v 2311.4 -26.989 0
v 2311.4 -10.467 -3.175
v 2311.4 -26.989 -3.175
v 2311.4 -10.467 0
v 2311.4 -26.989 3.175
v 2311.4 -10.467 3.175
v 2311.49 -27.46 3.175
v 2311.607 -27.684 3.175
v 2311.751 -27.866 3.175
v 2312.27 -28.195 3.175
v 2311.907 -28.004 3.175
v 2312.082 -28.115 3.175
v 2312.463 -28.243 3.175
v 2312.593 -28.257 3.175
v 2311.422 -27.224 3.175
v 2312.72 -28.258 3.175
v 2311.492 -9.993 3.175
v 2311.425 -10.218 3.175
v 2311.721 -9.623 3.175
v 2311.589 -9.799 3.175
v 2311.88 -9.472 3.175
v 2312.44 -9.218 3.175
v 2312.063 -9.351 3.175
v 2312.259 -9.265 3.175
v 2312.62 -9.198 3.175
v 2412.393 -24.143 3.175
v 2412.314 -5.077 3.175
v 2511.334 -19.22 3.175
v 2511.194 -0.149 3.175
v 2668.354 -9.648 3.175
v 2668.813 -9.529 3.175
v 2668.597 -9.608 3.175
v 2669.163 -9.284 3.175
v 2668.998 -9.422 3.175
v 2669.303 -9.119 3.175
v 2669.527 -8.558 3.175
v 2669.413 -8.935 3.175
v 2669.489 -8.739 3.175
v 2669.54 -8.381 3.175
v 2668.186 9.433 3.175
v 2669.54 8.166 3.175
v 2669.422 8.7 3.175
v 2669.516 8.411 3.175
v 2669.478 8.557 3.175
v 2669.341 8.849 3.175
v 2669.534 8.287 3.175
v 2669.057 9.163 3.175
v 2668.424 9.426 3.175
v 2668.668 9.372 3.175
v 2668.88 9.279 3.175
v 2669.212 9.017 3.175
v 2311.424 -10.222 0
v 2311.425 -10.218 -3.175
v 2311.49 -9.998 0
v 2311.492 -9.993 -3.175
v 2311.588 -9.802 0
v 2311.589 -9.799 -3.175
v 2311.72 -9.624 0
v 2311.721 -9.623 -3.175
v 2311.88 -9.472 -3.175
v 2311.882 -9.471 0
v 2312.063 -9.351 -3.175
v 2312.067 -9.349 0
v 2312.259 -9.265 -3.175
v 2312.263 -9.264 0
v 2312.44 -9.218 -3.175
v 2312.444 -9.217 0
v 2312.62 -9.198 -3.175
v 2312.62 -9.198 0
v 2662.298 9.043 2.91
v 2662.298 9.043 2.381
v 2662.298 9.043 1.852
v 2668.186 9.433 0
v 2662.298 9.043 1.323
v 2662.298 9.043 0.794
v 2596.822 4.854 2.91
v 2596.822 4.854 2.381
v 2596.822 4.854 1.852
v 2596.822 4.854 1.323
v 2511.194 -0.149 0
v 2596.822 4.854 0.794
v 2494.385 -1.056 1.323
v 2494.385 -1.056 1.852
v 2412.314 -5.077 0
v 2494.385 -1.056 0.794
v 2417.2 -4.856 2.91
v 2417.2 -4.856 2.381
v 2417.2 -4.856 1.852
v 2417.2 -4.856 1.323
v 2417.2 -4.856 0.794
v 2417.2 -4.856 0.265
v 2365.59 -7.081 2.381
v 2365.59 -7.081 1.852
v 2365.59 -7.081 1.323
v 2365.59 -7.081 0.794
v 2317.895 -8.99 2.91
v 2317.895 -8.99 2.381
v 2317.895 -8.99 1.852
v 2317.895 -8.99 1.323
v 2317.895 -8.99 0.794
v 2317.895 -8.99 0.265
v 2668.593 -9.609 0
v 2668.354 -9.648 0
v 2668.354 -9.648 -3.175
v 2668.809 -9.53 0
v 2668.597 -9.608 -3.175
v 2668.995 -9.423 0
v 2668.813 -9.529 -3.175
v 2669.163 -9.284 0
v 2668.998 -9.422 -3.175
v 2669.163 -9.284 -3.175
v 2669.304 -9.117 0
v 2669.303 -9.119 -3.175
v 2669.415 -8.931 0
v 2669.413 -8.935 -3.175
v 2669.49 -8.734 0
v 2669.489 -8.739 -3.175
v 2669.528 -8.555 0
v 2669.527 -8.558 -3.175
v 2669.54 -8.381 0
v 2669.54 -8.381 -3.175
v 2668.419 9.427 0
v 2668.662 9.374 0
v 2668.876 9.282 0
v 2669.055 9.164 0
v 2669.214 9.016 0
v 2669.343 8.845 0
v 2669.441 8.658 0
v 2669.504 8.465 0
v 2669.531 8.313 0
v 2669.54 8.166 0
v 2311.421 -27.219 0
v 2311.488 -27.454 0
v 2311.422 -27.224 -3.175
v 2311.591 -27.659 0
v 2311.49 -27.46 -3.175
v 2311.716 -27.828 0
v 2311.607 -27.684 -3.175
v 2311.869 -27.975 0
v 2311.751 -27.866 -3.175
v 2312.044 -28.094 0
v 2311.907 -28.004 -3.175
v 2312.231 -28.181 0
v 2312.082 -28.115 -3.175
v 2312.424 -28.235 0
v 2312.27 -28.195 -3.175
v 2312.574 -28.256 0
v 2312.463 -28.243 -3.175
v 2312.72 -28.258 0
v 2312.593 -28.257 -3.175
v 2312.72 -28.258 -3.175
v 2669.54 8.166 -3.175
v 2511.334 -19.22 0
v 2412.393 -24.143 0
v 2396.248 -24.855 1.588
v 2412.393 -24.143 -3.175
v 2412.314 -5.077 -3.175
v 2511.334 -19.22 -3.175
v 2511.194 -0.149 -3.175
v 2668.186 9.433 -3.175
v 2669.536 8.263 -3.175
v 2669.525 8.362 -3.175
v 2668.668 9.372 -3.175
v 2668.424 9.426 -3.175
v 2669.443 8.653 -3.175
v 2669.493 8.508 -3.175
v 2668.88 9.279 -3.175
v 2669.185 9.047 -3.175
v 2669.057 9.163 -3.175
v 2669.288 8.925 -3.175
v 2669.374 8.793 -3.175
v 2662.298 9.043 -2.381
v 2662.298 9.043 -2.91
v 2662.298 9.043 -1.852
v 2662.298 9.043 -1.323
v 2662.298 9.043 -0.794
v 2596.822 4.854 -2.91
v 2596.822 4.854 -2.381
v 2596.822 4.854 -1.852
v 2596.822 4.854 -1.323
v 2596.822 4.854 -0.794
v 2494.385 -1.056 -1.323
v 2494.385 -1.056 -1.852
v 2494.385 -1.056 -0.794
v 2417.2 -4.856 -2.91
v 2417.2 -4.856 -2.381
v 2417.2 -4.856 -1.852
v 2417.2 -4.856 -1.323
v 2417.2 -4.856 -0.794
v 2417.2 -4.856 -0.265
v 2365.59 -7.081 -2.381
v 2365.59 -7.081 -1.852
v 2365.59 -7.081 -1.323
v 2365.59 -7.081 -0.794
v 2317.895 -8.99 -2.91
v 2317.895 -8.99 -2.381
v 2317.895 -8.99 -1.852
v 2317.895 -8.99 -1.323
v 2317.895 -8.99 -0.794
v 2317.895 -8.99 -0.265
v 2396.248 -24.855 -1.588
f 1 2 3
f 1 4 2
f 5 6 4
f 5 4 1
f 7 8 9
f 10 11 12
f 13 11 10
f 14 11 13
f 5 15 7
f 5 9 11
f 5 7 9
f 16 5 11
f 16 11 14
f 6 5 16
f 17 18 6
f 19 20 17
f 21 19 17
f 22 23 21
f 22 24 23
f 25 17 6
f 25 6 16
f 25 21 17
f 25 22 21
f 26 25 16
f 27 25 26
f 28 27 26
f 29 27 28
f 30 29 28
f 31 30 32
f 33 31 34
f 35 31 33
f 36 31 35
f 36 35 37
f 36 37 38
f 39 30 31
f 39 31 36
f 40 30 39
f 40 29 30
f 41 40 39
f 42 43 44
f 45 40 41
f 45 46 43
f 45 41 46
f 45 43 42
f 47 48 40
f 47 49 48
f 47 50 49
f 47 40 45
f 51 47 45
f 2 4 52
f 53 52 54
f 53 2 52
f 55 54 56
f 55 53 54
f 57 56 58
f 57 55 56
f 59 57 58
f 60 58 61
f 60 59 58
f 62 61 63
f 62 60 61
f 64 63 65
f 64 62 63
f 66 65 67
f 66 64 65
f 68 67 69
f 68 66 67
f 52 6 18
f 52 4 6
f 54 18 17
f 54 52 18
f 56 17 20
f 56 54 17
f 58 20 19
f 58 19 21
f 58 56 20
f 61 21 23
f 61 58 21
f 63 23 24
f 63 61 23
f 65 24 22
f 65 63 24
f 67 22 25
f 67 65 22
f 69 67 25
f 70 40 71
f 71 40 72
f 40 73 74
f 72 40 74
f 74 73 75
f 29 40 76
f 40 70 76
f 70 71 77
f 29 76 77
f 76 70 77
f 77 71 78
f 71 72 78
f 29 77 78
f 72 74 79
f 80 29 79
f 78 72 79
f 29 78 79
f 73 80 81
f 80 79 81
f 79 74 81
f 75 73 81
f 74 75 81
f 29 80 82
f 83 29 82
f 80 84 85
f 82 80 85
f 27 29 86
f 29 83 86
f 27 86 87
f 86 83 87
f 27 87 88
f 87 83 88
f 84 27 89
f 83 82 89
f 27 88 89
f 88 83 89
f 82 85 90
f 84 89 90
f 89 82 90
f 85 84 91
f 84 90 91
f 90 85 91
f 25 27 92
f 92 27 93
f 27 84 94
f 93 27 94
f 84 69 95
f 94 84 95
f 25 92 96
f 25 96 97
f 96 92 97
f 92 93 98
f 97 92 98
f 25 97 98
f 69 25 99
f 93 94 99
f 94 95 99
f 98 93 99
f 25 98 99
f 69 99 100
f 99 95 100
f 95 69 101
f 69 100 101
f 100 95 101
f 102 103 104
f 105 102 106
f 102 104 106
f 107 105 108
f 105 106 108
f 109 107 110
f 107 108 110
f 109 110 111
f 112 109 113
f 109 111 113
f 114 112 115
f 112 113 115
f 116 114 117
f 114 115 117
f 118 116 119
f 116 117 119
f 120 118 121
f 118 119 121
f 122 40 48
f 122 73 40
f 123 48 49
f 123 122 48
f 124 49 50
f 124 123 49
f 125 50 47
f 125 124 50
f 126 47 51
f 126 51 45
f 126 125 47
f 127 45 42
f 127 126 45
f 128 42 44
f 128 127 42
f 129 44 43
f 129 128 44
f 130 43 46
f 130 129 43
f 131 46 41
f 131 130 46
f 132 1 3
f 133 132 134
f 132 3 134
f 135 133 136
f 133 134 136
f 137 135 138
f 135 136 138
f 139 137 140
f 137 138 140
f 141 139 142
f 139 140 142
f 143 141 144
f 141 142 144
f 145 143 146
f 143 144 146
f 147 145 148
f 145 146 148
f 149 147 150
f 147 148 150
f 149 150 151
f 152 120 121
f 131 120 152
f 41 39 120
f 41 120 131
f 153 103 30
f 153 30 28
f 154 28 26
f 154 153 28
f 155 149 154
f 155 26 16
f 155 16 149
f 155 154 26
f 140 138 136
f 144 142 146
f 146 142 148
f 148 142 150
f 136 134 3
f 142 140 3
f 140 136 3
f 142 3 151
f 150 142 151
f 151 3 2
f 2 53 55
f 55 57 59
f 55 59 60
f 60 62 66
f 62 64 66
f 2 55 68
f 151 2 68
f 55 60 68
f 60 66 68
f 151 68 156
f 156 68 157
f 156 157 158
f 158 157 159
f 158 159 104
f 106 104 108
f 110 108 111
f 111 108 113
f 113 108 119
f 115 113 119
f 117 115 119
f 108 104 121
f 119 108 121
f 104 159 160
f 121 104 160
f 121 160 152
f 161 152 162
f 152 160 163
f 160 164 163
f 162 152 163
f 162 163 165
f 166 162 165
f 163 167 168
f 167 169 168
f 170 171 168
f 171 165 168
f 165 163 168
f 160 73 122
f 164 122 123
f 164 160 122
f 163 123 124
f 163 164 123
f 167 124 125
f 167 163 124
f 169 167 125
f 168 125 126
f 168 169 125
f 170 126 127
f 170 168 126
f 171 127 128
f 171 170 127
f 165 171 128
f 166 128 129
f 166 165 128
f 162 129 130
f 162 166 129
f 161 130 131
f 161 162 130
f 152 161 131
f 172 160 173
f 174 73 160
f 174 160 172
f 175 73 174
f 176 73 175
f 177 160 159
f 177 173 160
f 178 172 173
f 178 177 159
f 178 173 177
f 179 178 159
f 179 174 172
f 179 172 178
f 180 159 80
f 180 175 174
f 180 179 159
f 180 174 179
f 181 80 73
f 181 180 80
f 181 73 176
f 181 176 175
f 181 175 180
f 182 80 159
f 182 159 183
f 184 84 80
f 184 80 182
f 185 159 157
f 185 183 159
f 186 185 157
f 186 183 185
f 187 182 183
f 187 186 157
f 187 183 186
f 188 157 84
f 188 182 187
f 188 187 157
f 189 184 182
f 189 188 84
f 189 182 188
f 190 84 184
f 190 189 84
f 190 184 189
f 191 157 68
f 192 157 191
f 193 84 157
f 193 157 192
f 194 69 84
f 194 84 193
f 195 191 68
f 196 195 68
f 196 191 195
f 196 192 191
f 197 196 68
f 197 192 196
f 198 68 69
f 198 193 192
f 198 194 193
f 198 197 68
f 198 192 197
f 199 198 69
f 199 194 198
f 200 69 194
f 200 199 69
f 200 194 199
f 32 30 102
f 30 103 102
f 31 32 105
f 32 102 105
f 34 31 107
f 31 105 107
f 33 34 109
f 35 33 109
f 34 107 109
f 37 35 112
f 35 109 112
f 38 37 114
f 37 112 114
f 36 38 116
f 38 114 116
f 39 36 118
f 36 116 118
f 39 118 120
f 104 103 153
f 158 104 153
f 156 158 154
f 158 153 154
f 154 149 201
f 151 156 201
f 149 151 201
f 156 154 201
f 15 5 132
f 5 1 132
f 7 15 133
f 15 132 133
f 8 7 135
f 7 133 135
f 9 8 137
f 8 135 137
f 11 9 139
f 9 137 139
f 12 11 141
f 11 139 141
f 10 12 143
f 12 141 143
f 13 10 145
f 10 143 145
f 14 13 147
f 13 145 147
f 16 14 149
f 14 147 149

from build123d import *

# Parameters (mm, degrees)
BOSS_EXTRUDE1_DEPTH = 3.175
FILLET1_R           = 1.27


with BuildPart() as part:
    # Sketch1 → Boss-Extrude1 (new, symmetric)
    with BuildSketch(Plane.XY):
        with BuildLine():
            Line((2311.4, -9.245652974), (2311.4, -28.310356345))
            add(Edge.make_bspline(
                [(2669.54, -9.569049356), (2615.393603553, -13.17073937), (2561.080658619, -16.536108081), (2506.205230446, -19.758621957), (2434.382223772, -23.29947809), (2362.559217098, -26.286274493), (2345.393069943, -26.972929947), (2328.342945407, -27.644579597), (2311.4, -28.310356345)],
                knots=[103.698913506, 103.698913506, 103.698913506, 103.698913506, 103.698913506, 103.698913506, 130.927896619, 130.927896619, 130.927896619, 139.270260279, 139.270260279, 139.270260279, 139.270260279, 139.270260279, 139.270260279], degree=5))
            Line((2669.54, -9.569049356), (2669.54, 9.5231025))
            add(Edge.make_bspline(
                [(2669.54, 9.5231025), (2667.126494524, 9.36235515), (2659.861586685, 8.880281494), (2635.666282302, 7.292469146), (2596.857665529, 4.826056853), (2545.729743039, 1.758344093), (2494.405305707, -1.098555235), (2451.533022267, -3.266573297), (2417.198316756, -4.86708361), (2391.457076919, -6.003589235), (2365.634736307, -7.086854581), (2341.015642019, -8.078542398), (2322.924133841, -8.79260451), (2313.562932275, -9.160652062), (2311.4, -9.245652974)],
                knots=[103.571582669, 103.571582669, 103.571582669, 103.571582669, 104.300777207, 105.766098403, 110.877392287, 115.98868617, 121.099980054, 126.211273938, 128.76692088, 131.322567822, 133.878214764, 136.433861706, 138.557690156, 139.196601892, 139.196601892, 139.196601892, 139.196601892], degree=3))
        make_face()
    extrude(amount=BOSS_EXTRUDE1_DEPTH, both=True)

    # Fillet1
    fillet1_edges = [part.edges().sort_by_distance(p)[0] for p in [
        (2669.54, 9.5231025, -1.5875),
        (2669.54, -9.569049356, -1.5875),
        (2311.4, -9.245652974, -1.5875),
        (2311.4, -28.310356345, -1.5875),
    ]]
    fillet(fillet1_edges, radius=FILLET1_R)


solid = part.part
